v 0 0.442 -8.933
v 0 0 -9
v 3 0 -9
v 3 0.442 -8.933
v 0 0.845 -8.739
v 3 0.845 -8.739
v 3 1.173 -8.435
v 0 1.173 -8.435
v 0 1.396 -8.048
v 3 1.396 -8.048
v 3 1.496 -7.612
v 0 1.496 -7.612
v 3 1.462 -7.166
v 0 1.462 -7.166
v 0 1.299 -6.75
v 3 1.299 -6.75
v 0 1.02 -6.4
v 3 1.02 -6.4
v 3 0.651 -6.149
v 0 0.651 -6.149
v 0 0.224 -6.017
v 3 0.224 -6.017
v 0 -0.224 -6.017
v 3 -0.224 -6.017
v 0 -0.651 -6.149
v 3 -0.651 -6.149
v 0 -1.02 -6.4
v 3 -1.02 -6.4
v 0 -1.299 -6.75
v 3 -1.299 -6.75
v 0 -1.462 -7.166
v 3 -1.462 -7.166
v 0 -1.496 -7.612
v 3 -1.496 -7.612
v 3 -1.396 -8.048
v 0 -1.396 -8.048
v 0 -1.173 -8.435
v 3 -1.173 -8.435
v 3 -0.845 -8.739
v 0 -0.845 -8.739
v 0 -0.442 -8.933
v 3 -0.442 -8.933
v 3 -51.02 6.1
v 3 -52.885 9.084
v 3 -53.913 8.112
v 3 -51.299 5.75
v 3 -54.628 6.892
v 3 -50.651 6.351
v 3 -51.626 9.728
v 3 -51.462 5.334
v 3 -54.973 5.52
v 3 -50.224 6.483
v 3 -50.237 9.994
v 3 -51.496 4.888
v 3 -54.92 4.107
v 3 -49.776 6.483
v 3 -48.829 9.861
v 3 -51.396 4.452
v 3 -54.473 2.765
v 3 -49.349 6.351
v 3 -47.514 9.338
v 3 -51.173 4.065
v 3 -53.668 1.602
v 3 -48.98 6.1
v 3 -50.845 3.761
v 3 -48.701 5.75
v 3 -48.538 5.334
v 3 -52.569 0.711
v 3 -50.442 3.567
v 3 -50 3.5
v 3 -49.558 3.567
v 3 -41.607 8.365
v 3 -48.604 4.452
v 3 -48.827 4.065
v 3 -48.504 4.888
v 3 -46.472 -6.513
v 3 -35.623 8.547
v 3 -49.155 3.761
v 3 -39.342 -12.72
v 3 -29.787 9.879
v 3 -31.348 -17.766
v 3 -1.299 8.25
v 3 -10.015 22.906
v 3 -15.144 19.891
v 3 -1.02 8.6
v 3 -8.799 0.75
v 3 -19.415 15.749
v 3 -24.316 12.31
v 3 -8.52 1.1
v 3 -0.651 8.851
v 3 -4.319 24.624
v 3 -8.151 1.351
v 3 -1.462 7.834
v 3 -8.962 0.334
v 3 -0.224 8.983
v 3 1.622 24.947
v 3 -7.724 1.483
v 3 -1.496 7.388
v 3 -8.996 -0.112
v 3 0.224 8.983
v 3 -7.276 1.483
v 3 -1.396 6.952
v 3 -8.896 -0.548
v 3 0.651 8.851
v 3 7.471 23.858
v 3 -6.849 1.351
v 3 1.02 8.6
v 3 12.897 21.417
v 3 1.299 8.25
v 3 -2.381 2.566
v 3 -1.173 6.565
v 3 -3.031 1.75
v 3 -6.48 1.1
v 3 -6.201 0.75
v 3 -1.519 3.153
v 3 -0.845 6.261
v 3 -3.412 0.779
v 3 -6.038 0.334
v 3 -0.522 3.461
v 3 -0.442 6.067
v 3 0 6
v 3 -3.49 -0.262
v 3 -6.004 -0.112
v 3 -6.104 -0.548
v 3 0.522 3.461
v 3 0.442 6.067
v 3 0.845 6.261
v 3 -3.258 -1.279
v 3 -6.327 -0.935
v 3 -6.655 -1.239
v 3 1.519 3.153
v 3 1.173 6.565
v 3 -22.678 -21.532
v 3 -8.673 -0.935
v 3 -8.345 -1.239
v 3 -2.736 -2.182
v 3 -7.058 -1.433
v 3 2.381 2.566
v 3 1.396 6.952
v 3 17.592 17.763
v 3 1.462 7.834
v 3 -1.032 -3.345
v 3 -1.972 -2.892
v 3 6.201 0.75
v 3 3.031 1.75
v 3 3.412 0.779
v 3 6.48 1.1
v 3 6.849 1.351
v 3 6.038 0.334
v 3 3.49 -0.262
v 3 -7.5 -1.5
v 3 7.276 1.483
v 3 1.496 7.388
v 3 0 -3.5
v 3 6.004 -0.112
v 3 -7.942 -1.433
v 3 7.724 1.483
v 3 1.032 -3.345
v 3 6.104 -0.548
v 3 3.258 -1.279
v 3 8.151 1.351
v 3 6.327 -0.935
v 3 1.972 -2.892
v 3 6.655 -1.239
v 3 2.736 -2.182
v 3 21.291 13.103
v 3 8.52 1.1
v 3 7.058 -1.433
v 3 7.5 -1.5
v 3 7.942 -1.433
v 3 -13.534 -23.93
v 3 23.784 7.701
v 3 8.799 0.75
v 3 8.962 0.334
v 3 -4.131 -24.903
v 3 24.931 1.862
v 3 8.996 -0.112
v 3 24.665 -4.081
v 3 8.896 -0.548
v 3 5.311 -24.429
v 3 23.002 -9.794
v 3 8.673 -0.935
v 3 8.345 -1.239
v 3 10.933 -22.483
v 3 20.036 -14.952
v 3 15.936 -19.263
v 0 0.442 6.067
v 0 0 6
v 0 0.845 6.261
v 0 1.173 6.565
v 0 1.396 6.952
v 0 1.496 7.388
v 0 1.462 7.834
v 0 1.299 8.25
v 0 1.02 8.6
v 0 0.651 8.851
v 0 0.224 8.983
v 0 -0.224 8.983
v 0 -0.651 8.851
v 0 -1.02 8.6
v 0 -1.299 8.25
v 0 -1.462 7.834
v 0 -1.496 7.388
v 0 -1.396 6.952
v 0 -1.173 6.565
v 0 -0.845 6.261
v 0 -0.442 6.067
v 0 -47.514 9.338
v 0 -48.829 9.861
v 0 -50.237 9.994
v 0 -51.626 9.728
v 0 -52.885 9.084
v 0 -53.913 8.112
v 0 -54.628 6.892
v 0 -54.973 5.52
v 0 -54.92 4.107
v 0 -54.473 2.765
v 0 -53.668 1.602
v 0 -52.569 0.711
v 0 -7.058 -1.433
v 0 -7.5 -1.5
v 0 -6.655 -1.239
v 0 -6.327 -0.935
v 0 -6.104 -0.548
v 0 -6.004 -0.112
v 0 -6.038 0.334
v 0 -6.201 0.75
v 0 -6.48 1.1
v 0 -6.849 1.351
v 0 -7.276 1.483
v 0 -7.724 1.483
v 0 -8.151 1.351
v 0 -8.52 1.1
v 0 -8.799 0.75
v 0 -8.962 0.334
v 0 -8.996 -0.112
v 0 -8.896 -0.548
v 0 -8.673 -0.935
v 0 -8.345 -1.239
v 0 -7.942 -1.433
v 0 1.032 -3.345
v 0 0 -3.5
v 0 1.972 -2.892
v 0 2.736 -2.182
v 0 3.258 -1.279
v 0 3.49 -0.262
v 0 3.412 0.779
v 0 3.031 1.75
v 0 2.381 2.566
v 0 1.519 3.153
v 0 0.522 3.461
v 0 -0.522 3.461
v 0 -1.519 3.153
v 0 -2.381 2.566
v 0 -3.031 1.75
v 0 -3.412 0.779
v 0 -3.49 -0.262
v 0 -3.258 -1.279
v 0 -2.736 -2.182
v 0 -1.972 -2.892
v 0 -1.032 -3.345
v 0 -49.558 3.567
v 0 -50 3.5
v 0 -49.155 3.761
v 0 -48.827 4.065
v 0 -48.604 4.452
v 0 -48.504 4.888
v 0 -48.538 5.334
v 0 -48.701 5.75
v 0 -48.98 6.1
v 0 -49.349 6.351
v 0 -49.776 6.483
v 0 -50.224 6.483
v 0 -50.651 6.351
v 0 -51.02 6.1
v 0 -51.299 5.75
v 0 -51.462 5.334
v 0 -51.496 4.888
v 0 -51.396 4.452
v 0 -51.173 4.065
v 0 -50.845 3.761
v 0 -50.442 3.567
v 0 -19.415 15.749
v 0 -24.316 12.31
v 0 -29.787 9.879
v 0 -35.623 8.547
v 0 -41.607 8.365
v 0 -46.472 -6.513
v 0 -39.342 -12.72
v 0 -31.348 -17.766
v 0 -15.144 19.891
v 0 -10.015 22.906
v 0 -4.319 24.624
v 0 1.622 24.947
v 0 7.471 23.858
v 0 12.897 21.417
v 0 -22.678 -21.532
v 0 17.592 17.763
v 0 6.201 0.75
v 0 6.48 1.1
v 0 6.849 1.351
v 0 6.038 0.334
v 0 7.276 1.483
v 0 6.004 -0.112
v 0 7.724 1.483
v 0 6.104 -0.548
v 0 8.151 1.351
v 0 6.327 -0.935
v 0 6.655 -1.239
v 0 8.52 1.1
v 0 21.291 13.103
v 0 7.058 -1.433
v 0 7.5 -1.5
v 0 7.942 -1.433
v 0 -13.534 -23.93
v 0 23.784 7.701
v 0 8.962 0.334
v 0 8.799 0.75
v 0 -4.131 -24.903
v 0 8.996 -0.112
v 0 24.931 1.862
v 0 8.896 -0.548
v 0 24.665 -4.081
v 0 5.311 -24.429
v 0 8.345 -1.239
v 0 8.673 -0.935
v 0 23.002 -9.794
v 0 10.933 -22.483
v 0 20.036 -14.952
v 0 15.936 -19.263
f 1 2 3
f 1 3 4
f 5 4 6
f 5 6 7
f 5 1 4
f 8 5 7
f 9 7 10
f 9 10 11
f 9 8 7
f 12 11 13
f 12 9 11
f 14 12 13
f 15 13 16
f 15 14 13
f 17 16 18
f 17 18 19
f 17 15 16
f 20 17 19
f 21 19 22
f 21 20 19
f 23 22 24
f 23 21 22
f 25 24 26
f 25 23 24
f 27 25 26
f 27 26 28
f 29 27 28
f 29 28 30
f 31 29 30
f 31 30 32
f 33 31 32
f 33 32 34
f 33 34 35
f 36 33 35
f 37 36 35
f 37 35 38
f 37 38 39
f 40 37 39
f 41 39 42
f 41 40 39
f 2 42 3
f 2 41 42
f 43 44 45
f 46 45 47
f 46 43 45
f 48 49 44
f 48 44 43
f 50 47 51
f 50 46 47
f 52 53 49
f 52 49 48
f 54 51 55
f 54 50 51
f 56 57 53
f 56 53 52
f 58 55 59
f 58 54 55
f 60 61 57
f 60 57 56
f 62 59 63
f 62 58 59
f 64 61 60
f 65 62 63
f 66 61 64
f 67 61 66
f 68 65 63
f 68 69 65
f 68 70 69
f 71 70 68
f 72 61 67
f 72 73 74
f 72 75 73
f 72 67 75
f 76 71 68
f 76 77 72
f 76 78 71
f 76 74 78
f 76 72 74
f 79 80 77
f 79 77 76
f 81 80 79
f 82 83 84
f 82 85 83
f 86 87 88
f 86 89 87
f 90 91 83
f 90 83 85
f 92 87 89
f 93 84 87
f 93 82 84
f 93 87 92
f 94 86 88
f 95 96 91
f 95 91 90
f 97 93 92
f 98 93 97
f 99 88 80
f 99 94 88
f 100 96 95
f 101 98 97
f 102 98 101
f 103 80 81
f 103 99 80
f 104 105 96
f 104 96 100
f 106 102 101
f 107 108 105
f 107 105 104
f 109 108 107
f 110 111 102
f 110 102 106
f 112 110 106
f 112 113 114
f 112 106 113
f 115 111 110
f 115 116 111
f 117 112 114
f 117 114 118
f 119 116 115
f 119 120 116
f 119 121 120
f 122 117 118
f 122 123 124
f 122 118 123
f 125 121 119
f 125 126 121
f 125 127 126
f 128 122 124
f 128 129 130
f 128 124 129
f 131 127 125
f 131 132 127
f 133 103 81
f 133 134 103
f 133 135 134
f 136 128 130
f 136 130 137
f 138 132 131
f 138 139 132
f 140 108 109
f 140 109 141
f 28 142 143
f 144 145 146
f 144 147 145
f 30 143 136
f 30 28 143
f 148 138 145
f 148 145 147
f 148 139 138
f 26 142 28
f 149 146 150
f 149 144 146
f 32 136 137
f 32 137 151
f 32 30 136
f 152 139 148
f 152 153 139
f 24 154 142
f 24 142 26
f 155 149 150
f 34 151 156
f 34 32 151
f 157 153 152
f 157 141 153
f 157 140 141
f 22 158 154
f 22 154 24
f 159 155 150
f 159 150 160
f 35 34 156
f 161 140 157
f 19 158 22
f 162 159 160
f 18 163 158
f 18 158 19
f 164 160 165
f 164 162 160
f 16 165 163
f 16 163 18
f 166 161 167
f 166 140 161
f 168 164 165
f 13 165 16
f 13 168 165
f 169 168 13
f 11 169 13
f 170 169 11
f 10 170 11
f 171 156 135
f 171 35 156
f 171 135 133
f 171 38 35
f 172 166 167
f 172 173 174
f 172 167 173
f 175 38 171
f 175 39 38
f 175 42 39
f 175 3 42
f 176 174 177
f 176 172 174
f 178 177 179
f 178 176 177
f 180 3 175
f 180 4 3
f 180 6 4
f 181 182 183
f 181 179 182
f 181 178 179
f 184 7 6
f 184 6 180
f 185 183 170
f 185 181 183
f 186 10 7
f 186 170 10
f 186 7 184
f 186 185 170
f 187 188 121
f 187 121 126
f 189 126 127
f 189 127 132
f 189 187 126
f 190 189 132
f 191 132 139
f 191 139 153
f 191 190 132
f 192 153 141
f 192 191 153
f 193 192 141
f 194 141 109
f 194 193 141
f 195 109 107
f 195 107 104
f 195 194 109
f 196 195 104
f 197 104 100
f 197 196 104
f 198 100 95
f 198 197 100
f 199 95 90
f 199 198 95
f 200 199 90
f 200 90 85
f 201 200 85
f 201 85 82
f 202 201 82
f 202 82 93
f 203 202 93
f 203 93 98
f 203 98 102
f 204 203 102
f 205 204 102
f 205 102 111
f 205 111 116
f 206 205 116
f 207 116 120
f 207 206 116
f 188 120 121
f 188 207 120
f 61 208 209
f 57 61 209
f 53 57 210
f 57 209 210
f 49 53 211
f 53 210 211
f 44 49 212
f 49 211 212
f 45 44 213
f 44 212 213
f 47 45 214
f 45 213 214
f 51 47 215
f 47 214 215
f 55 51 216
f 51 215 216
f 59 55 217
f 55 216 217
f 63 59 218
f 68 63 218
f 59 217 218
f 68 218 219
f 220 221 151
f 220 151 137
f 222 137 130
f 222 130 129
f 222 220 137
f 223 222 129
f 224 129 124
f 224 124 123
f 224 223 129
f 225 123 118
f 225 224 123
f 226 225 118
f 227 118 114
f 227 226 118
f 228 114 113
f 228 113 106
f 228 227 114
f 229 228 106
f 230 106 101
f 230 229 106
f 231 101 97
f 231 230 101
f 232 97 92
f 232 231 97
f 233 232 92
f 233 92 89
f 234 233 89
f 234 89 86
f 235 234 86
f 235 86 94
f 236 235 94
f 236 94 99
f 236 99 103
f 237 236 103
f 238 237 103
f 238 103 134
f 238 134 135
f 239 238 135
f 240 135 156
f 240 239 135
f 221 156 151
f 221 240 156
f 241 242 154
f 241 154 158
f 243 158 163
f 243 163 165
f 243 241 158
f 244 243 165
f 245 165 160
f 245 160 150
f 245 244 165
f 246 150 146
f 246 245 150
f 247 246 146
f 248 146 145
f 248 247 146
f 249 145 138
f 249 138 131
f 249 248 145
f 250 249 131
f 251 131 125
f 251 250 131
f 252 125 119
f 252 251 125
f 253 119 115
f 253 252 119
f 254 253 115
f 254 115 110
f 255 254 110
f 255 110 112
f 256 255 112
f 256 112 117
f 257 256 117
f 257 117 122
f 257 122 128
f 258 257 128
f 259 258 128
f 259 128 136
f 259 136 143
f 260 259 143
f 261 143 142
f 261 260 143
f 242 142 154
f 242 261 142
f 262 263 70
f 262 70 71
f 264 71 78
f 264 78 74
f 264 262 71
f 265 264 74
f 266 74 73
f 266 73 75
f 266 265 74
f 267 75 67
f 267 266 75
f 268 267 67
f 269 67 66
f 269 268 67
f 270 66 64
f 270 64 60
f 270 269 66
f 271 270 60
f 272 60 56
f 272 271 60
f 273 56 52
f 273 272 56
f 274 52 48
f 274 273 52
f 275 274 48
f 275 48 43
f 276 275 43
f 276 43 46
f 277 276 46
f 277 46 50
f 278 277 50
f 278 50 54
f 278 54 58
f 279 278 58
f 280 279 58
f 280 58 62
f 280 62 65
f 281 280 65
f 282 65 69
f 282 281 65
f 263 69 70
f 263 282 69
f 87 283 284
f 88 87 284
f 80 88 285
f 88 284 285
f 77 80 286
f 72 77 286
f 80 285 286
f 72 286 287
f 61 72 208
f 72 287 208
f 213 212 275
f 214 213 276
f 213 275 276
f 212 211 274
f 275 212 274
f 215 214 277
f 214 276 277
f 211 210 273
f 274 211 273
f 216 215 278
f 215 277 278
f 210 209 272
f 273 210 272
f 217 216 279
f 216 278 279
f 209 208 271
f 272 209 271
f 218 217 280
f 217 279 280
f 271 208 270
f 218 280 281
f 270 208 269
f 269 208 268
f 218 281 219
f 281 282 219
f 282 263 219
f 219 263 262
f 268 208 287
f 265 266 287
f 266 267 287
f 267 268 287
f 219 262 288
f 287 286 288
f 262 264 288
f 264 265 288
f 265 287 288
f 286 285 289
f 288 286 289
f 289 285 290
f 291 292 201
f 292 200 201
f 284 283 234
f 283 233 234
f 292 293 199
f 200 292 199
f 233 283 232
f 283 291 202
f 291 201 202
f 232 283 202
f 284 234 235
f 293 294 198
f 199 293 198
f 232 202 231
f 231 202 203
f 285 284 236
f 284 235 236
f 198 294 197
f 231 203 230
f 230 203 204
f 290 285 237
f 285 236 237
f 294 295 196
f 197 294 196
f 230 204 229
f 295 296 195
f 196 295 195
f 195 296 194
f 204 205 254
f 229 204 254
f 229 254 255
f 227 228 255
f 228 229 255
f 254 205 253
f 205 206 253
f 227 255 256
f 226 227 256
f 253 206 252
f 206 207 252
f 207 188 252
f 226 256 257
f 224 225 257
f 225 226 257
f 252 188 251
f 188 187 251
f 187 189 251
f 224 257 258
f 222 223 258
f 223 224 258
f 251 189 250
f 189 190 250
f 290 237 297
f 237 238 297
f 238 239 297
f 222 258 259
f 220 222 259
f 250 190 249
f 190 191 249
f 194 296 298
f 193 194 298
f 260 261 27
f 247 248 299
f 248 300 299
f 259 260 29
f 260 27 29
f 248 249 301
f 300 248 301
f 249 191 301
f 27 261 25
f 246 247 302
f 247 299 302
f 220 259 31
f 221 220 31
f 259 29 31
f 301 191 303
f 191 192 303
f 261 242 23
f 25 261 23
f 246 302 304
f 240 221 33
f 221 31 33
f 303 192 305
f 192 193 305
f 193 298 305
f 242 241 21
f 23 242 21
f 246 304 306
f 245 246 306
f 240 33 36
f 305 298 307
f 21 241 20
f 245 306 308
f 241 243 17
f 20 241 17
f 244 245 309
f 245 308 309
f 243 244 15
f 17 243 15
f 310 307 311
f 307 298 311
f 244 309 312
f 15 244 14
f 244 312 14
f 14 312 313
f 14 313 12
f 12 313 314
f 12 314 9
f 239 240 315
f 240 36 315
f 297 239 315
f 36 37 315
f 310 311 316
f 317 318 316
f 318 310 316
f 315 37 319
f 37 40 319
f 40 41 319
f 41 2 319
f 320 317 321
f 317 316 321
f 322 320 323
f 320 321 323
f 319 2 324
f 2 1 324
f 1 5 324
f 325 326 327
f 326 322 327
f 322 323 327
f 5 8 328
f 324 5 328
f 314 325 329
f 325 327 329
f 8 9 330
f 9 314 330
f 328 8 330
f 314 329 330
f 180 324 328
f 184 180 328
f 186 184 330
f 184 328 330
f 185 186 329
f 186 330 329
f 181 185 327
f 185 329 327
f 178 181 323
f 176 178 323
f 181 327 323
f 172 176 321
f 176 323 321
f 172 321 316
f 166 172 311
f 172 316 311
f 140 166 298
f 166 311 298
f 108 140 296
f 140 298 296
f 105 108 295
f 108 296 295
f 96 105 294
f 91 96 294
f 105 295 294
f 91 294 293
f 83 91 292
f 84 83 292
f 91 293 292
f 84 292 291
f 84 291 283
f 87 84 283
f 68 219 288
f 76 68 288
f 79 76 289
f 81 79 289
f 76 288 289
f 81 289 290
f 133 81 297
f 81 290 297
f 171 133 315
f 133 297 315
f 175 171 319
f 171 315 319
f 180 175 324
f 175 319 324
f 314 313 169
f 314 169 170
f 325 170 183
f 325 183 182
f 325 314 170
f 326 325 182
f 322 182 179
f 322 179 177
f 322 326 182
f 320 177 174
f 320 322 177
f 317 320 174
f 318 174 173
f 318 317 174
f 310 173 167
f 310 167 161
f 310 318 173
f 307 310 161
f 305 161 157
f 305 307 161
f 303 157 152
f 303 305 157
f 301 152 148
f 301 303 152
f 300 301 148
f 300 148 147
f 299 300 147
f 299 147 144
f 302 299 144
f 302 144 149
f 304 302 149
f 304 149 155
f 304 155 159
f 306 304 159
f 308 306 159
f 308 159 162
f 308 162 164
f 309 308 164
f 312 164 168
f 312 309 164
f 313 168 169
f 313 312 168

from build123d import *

# Parameters (mm, degrees)
CROQUIS1_R              = 3.5
CROQUIS1_R_2            = 1.5
SALIENTE_EXTRUIR1_DEPTH = 3


with BuildPart() as part:
    # Croquis1 → Saliente-Extruir1 (new body)
    with BuildSketch(Plane(origin=(0, 0, 0), x_dir=(0, 0, -1), z_dir=(1, 0, 0))):
        with BuildLine():
            ThreePointArc((24.429451457, 5.310546254), (-13.102683121, 21.291305621), (-15.74927408, -19.415467184))
            ThreePointArc((-15.74927408, -19.415467184), (-9.07160693, -32.67265708), (-9.338328875, -47.514260157))
            ThreePointArc((-9.338328875, -47.514260157), (-7.527733898, -54.313995983), (-0.71074339, -52.569489781))
            ThreePointArc((-0.71074339, -52.569489781), (19.815359954, -27.085163099), (24.429451457, 5.310546254))
        make_face()
        Circle(CROQUIS1_R, mode=Mode.SUBTRACT)
        with Locations((-5, -50)):
            Circle(CROQUIS1_R_2, mode=Mode.SUBTRACT)
        with Locations((-7.5, 0)):
            Circle(CROQUIS1_R_2, mode=Mode.SUBTRACT)
        with Locations((0, 7.5)):
            Circle(CROQUIS1_R_2, mode=Mode.SUBTRACT)
        with Locations((7.5, 0)):
            Circle(CROQUIS1_R_2, mode=Mode.SUBTRACT)
        with Locations((0, -7.5)):
            Circle(CROQUIS1_R_2, mode=Mode.SUBTRACT)
    extrude(amount=SALIENTE_EXTRUIR1_DEPTH)


solid = part.part
